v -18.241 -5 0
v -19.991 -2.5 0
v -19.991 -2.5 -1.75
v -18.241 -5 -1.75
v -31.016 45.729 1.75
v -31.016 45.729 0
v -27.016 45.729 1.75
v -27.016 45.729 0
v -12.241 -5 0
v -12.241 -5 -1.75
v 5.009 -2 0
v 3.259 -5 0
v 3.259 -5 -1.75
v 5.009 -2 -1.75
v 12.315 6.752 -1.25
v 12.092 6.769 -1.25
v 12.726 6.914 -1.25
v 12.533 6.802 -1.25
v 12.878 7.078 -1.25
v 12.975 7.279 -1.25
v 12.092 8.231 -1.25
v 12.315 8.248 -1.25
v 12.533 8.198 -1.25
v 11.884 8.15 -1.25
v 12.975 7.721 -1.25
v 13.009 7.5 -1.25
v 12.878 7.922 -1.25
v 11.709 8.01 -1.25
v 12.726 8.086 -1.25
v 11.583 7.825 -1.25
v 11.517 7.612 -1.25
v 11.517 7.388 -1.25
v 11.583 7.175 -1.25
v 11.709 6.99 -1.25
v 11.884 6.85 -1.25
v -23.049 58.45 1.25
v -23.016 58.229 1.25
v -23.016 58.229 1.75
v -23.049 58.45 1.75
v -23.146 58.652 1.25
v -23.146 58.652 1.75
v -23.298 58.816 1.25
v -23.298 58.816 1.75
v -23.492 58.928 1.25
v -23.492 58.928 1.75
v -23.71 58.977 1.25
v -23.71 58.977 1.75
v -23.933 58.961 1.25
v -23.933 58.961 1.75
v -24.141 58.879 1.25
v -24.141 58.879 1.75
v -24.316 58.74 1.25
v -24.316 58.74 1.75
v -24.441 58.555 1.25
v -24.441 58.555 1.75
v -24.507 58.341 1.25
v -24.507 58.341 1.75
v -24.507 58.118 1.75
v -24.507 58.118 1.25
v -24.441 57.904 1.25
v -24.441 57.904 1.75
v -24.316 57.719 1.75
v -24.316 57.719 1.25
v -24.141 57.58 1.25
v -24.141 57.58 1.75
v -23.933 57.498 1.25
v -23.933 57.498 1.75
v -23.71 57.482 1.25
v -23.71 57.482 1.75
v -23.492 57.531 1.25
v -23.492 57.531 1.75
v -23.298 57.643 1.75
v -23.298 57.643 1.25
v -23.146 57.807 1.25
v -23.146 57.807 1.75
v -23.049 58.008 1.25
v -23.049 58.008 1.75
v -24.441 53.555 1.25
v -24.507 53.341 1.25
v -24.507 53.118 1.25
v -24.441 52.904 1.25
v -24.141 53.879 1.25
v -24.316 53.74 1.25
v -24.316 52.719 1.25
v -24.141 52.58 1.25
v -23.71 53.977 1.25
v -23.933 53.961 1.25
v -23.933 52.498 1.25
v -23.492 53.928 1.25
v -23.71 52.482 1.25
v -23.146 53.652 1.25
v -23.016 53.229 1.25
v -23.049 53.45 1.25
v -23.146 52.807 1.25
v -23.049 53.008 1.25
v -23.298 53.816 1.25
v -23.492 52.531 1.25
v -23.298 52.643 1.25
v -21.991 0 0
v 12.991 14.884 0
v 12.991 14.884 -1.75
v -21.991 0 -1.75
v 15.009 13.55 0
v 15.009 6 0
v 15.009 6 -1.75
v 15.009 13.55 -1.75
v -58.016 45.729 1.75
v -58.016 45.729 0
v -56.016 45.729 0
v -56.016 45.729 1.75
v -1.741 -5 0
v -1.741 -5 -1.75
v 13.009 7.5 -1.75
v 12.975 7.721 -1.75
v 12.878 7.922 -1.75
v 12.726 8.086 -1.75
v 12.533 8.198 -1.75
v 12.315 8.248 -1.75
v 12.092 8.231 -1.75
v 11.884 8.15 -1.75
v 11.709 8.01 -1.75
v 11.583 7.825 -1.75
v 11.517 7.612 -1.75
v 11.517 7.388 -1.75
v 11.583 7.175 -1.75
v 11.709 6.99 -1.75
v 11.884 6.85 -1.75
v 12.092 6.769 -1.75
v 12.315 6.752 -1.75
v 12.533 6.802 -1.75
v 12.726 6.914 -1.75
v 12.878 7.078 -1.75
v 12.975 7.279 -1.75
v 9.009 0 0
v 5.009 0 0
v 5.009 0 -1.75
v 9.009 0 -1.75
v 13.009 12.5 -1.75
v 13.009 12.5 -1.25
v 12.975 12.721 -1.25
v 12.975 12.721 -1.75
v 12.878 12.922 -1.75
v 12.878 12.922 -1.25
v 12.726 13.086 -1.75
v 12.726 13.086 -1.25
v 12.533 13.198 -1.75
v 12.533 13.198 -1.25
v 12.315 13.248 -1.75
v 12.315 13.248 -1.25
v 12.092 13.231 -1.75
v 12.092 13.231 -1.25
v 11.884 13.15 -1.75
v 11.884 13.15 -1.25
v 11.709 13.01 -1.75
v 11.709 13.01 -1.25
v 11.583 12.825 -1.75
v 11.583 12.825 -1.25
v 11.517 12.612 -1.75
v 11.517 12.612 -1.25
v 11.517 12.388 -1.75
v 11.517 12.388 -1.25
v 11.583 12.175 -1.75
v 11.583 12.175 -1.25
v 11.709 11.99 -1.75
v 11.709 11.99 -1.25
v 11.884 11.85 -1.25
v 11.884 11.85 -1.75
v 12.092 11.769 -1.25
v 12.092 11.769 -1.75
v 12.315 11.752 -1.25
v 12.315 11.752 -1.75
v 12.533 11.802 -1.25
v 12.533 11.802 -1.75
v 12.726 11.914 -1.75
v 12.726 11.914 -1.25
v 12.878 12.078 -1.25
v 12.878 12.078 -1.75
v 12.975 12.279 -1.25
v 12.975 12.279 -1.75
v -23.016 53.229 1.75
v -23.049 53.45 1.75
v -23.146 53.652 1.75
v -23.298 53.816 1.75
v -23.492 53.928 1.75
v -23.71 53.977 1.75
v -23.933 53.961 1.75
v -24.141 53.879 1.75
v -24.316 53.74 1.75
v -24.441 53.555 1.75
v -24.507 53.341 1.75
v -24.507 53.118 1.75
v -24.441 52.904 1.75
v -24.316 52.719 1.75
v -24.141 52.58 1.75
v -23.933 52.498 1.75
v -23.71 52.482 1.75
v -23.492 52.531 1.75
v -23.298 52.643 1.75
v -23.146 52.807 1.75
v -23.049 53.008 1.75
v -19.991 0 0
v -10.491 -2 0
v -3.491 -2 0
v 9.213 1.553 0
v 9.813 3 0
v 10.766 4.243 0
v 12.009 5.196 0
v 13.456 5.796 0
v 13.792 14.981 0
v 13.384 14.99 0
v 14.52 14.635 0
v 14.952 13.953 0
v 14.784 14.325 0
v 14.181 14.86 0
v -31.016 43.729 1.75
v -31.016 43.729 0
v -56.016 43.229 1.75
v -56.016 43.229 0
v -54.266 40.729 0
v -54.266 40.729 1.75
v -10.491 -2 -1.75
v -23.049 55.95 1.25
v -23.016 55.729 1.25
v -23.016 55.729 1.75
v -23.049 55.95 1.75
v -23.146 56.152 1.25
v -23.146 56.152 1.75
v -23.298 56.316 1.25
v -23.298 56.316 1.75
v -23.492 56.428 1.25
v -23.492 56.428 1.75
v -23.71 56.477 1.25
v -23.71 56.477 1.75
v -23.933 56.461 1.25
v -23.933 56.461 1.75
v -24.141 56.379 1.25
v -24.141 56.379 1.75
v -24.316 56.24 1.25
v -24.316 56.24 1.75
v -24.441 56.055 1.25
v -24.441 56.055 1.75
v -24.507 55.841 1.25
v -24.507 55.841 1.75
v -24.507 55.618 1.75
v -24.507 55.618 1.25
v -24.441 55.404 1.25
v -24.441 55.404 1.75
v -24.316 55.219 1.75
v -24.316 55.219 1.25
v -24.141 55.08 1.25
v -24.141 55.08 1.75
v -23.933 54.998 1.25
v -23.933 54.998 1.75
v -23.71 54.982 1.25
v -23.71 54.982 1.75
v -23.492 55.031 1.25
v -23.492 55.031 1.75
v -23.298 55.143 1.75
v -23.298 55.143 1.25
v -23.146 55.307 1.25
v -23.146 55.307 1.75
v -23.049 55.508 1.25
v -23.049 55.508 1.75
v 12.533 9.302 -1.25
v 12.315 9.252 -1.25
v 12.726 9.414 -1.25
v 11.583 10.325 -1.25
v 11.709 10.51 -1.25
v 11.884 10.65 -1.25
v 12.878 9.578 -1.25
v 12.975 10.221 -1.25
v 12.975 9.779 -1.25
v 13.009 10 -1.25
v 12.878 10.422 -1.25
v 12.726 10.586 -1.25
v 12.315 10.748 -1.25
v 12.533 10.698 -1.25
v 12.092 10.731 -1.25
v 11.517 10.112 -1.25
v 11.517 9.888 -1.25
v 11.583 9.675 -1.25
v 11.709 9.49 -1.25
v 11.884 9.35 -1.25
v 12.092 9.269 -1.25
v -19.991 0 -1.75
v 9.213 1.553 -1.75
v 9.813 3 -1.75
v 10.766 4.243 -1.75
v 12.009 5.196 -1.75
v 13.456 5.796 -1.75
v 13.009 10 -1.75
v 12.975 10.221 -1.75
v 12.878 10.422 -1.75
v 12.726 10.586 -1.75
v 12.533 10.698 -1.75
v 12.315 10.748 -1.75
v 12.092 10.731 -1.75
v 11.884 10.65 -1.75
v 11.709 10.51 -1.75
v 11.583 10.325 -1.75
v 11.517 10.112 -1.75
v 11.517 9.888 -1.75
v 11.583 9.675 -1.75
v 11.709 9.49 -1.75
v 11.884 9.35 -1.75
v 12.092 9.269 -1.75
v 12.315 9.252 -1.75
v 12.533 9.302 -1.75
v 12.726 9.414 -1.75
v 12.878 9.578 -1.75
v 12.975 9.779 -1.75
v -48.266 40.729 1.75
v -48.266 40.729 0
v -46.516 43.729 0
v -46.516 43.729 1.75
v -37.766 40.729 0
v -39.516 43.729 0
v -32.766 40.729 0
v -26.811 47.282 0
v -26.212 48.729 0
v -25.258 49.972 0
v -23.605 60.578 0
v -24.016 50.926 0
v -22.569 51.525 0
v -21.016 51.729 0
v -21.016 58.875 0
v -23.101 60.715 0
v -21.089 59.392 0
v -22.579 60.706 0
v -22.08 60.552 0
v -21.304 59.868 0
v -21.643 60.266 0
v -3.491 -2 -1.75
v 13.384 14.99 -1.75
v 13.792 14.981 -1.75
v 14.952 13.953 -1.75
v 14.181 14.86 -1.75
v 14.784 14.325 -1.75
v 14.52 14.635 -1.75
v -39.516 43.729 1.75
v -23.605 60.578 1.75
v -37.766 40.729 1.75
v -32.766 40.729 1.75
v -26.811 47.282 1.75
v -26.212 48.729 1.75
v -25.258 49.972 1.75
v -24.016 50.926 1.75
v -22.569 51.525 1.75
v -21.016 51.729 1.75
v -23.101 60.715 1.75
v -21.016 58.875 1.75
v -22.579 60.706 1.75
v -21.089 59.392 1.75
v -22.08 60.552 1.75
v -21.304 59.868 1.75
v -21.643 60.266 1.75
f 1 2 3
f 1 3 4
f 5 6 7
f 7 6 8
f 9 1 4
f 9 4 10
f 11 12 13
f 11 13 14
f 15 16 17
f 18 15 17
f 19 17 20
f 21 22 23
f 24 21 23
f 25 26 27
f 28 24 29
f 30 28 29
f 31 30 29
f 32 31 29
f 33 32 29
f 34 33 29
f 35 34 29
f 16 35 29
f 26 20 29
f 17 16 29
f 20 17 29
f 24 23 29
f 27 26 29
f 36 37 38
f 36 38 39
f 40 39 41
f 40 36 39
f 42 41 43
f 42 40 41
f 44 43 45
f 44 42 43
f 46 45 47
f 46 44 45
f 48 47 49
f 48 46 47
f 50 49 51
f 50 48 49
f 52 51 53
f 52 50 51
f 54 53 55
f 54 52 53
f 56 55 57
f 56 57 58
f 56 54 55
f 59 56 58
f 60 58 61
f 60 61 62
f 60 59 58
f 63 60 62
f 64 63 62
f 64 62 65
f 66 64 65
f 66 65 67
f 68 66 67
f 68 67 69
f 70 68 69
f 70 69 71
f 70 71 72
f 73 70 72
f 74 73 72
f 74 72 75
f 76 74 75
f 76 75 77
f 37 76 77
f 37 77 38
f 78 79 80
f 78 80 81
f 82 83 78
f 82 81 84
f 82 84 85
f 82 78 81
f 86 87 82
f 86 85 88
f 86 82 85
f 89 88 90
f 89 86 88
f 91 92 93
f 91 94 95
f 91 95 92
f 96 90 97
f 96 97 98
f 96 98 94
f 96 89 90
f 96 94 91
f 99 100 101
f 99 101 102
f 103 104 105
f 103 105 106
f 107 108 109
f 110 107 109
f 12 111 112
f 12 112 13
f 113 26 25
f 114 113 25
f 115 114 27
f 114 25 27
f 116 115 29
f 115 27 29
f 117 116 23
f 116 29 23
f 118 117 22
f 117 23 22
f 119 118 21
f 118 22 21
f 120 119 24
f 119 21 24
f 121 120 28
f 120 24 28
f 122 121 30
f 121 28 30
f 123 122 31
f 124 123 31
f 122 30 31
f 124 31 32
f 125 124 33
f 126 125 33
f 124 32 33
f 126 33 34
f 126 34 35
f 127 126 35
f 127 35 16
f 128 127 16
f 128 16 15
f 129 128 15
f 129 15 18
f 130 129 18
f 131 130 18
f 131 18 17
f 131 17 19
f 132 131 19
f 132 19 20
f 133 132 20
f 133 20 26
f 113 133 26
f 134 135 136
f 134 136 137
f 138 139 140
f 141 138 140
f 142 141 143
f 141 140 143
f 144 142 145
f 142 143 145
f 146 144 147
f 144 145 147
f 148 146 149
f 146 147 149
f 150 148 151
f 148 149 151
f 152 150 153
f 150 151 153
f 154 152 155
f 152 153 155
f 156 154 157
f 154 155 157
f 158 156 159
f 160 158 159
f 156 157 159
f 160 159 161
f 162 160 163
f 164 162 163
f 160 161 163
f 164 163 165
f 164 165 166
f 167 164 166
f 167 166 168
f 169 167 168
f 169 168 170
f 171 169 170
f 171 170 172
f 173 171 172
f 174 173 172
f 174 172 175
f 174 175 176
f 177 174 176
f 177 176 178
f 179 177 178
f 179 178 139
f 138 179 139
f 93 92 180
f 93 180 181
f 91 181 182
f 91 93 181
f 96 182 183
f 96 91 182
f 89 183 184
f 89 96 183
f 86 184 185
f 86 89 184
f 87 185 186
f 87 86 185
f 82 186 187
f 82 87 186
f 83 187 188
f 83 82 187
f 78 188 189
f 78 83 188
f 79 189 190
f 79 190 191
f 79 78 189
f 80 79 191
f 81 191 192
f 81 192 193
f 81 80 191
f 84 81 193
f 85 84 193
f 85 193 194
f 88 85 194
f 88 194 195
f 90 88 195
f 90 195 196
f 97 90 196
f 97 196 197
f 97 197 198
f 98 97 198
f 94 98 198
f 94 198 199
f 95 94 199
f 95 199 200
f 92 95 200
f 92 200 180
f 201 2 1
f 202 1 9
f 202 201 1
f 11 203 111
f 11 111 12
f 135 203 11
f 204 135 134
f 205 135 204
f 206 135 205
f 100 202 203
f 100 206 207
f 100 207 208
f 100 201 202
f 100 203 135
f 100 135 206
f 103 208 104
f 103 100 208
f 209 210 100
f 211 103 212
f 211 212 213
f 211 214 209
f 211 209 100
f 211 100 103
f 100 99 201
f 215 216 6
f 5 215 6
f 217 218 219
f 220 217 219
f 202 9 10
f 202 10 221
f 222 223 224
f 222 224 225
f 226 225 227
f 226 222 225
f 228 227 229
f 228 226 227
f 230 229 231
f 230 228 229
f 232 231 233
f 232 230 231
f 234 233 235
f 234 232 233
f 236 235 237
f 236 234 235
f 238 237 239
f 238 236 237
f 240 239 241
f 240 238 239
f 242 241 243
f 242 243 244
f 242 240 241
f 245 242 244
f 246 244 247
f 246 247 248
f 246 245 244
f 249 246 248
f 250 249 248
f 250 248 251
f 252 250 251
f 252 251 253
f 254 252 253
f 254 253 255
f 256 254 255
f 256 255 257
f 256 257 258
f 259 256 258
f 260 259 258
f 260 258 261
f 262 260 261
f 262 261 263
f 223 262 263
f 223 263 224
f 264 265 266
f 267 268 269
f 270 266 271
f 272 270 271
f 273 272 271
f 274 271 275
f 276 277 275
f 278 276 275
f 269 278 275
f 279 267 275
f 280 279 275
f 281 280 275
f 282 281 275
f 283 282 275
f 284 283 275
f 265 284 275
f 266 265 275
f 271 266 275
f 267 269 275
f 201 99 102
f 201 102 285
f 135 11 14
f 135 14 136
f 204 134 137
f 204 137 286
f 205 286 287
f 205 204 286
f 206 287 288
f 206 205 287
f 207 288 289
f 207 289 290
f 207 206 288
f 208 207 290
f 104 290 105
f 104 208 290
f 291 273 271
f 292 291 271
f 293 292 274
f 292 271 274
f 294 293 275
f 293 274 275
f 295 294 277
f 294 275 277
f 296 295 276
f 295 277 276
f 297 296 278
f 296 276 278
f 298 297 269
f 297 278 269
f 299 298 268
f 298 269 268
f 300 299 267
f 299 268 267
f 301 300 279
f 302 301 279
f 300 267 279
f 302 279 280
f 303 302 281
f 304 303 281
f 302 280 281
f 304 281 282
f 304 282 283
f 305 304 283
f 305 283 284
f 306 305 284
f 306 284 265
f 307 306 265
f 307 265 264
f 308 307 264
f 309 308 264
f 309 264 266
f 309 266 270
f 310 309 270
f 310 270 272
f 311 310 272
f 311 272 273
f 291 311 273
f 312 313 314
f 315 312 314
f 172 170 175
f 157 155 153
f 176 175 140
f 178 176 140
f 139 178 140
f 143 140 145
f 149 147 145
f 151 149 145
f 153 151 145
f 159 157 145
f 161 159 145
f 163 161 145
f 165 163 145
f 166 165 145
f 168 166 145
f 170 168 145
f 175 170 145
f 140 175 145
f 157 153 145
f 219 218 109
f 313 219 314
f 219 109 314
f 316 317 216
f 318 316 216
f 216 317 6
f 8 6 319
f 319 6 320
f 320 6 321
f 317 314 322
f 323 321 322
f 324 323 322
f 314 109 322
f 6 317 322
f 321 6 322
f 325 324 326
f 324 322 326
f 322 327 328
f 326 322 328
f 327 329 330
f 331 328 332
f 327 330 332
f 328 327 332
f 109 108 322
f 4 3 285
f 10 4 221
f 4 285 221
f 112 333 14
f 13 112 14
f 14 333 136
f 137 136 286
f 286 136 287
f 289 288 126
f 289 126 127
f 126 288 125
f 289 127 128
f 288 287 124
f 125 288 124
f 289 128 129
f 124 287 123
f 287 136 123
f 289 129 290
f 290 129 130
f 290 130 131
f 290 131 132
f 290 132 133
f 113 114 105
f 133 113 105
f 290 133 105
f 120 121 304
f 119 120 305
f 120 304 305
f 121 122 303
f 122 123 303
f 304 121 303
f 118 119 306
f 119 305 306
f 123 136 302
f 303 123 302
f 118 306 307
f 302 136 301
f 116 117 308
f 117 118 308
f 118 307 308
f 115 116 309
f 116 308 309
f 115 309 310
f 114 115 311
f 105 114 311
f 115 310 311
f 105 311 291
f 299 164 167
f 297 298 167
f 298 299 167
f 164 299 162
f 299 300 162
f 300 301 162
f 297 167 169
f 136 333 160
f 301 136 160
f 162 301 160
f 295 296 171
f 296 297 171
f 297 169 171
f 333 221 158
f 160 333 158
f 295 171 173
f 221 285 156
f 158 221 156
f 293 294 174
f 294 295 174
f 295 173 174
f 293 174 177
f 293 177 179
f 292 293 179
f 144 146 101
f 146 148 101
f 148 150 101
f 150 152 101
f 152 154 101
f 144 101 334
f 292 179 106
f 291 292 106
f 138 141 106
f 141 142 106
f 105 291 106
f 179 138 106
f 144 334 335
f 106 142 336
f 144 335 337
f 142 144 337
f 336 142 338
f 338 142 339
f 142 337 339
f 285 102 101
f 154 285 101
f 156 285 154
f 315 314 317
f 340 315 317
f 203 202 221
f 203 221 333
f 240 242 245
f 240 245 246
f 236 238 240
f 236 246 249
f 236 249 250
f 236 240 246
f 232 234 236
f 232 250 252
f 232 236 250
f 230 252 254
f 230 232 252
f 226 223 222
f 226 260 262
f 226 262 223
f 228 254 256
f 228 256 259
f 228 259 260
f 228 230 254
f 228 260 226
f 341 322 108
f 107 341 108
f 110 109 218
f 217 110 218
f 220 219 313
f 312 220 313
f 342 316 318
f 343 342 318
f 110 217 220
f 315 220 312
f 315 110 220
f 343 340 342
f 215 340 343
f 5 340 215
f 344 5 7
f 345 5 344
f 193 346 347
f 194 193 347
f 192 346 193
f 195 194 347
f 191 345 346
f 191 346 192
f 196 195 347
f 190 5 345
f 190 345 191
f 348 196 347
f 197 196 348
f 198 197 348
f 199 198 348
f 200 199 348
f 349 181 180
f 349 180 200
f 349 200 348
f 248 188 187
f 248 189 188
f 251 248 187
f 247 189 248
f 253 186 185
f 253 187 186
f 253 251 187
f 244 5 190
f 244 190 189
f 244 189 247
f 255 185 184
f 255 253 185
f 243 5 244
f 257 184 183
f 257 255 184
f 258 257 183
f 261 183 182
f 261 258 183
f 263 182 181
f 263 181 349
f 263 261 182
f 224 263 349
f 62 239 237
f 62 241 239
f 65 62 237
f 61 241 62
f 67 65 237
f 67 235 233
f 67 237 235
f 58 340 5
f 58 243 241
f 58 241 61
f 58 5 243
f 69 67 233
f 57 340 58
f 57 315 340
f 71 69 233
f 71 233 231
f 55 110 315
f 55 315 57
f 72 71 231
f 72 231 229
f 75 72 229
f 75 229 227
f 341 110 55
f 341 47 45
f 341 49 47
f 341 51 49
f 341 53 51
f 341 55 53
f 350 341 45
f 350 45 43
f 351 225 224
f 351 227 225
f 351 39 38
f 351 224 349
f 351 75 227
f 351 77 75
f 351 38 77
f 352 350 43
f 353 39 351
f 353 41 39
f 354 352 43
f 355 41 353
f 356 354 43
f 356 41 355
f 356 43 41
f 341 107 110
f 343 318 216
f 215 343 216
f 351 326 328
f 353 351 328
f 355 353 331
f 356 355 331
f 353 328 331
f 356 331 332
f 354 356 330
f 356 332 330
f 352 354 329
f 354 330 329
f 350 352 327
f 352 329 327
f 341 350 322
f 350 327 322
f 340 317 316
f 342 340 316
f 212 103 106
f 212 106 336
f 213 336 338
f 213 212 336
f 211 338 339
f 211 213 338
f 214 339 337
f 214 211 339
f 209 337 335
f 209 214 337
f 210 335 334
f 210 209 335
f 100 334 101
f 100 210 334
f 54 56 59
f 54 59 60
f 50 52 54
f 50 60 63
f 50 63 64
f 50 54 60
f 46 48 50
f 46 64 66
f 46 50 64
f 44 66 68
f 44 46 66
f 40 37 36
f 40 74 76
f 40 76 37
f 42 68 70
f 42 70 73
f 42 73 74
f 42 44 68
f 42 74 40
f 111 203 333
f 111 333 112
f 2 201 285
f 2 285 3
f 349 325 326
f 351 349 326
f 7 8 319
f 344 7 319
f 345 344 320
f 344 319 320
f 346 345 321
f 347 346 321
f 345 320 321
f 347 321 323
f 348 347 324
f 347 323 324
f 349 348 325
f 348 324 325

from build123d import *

# Parameters (mm, degrees)
F1_R     = 0.75
F2_DEPTH = 1.75
F0_R     = 0.75
F3_DEPTH = 1.75
F4_DEPTH = 1.25
F5_DEPTH = 1.25


with BuildPart() as f2:
    # F1 (on Top) → F2 (new body)
    with BuildSketch(Plane.XY):
        with BuildLine():
            Line((12.99089, 14.884238), (-21.991227, 0))
            Line((-21.991227, 0), (-19.991227, 0))
            Line((-19.991227, 0), (-19.991227, -2.5))
            Line((-19.991227, -2.5), (-18.241227, -5))
            Line((-18.241227, -5), (-12.241227, -5))
            Line((-12.241227, -5), (-10.491227, -2))
            Line((-10.491227, -2), (-3.491227, -2))
            Line((-3.491227, -2), (-1.741227, -5))
            Line((-1.741227, -5), (3.258773, -5))
            Line((3.258773, -5), (5.008773, -2))
            Line((5.008773, -2), (5.008773, 0))
            Line((5.008773, 0), (9.008773, 0))
            ThreePointArc((9.008773, 0), (10.766133, 4.242641), (15.008773, 6))
            Line((15.008773, 6), (15.008773, 13.549867))
            ThreePointArc((15.008773, 13.549867), (14.358507, 14.759453), (12.99089, 14.884238))
        make_face()
        with Locations((12.258773, 7.5)):
            Circle(F1_R, mode=Mode.SUBTRACT)
        with Locations((12.258773, 10)):
            Circle(F1_R, mode=Mode.SUBTRACT)
        with Locations((12.258773, 12.5)):
            Circle(F1_R, mode=Mode.SUBTRACT)
    extrude(amount=-F2_DEPTH)

    # F1 (on Top) → F4 (join)
    with BuildSketch(Plane.XY):
        with Locations((12.258773, 12.5)):
            Circle(F1_R)
        with Locations((12.258773, 10)):
            Circle(F1_R)
        with Locations((12.258773, 7.5)):
            Circle(F1_R)
    extrude(amount=-F4_DEPTH)


with BuildPart() as f3:
    # F0 (on Top) → F3 (new body)
    with BuildSketch(Plane.XY):
        with BuildLine():
            Line((-23.604643, 60.577677), (-58.015765, 45.729411))
            Line((-58.015765, 45.729411), (-56.015765, 45.729411))
            Line((-56.015765, 45.729411), (-56.015765, 43.229411))
            Line((-56.015765, 43.229411), (-54.265765, 40.729411))
            Line((-54.265765, 40.729411), (-48.265765, 40.729411))
            Line((-48.265765, 40.729411), (-46.515765, 43.729411))
            Line((-46.515765, 43.729411), (-39.515765, 43.729411))
            Line((-39.515765, 43.729411), (-37.765765, 40.729411))
            Line((-37.765765, 40.729411), (-32.765765, 40.729411))
            Line((-32.765765, 40.729411), (-31.015765, 43.729411))
            Line((-31.015765, 43.729411), (-31.015765, 45.729411))
            Line((-31.015765, 45.729411), (-27.015765, 45.729411))
            ThreePointArc((-27.015765, 45.729411), (-25.258406, 49.972051), (-21.015765, 51.729411))
            Line((-21.015765, 51.729411), (-21.015765, 58.875162))
            ThreePointArc((-21.015765, 58.875162), (-21.851178, 60.424424), (-23.604643, 60.577677))
        make_face()
        with Locations((-23.765765, 53.229411)):
            Circle(F0_R, mode=Mode.SUBTRACT)
        with Locations((-23.765765, 55.729411)):
            Circle(F0_R, mode=Mode.SUBTRACT)
        with Locations((-23.765765, 58.229411)):
            Circle(F0_R, mode=Mode.SUBTRACT)
    extrude(amount=F3_DEPTH)

    # F0 (on Top) → F5 (join)
    with BuildSketch(Plane.XY):
        with Locations((-23.765765, 58.229411)):
            Circle(F0_R)
        with Locations((-23.765765, 55.729411)):
            Circle(F0_R)
        with Locations((-23.765765, 53.229411)):
            Circle(F0_R)
    extrude(amount=F5_DEPTH)


solid = Compound([f2.part, f3.part])
